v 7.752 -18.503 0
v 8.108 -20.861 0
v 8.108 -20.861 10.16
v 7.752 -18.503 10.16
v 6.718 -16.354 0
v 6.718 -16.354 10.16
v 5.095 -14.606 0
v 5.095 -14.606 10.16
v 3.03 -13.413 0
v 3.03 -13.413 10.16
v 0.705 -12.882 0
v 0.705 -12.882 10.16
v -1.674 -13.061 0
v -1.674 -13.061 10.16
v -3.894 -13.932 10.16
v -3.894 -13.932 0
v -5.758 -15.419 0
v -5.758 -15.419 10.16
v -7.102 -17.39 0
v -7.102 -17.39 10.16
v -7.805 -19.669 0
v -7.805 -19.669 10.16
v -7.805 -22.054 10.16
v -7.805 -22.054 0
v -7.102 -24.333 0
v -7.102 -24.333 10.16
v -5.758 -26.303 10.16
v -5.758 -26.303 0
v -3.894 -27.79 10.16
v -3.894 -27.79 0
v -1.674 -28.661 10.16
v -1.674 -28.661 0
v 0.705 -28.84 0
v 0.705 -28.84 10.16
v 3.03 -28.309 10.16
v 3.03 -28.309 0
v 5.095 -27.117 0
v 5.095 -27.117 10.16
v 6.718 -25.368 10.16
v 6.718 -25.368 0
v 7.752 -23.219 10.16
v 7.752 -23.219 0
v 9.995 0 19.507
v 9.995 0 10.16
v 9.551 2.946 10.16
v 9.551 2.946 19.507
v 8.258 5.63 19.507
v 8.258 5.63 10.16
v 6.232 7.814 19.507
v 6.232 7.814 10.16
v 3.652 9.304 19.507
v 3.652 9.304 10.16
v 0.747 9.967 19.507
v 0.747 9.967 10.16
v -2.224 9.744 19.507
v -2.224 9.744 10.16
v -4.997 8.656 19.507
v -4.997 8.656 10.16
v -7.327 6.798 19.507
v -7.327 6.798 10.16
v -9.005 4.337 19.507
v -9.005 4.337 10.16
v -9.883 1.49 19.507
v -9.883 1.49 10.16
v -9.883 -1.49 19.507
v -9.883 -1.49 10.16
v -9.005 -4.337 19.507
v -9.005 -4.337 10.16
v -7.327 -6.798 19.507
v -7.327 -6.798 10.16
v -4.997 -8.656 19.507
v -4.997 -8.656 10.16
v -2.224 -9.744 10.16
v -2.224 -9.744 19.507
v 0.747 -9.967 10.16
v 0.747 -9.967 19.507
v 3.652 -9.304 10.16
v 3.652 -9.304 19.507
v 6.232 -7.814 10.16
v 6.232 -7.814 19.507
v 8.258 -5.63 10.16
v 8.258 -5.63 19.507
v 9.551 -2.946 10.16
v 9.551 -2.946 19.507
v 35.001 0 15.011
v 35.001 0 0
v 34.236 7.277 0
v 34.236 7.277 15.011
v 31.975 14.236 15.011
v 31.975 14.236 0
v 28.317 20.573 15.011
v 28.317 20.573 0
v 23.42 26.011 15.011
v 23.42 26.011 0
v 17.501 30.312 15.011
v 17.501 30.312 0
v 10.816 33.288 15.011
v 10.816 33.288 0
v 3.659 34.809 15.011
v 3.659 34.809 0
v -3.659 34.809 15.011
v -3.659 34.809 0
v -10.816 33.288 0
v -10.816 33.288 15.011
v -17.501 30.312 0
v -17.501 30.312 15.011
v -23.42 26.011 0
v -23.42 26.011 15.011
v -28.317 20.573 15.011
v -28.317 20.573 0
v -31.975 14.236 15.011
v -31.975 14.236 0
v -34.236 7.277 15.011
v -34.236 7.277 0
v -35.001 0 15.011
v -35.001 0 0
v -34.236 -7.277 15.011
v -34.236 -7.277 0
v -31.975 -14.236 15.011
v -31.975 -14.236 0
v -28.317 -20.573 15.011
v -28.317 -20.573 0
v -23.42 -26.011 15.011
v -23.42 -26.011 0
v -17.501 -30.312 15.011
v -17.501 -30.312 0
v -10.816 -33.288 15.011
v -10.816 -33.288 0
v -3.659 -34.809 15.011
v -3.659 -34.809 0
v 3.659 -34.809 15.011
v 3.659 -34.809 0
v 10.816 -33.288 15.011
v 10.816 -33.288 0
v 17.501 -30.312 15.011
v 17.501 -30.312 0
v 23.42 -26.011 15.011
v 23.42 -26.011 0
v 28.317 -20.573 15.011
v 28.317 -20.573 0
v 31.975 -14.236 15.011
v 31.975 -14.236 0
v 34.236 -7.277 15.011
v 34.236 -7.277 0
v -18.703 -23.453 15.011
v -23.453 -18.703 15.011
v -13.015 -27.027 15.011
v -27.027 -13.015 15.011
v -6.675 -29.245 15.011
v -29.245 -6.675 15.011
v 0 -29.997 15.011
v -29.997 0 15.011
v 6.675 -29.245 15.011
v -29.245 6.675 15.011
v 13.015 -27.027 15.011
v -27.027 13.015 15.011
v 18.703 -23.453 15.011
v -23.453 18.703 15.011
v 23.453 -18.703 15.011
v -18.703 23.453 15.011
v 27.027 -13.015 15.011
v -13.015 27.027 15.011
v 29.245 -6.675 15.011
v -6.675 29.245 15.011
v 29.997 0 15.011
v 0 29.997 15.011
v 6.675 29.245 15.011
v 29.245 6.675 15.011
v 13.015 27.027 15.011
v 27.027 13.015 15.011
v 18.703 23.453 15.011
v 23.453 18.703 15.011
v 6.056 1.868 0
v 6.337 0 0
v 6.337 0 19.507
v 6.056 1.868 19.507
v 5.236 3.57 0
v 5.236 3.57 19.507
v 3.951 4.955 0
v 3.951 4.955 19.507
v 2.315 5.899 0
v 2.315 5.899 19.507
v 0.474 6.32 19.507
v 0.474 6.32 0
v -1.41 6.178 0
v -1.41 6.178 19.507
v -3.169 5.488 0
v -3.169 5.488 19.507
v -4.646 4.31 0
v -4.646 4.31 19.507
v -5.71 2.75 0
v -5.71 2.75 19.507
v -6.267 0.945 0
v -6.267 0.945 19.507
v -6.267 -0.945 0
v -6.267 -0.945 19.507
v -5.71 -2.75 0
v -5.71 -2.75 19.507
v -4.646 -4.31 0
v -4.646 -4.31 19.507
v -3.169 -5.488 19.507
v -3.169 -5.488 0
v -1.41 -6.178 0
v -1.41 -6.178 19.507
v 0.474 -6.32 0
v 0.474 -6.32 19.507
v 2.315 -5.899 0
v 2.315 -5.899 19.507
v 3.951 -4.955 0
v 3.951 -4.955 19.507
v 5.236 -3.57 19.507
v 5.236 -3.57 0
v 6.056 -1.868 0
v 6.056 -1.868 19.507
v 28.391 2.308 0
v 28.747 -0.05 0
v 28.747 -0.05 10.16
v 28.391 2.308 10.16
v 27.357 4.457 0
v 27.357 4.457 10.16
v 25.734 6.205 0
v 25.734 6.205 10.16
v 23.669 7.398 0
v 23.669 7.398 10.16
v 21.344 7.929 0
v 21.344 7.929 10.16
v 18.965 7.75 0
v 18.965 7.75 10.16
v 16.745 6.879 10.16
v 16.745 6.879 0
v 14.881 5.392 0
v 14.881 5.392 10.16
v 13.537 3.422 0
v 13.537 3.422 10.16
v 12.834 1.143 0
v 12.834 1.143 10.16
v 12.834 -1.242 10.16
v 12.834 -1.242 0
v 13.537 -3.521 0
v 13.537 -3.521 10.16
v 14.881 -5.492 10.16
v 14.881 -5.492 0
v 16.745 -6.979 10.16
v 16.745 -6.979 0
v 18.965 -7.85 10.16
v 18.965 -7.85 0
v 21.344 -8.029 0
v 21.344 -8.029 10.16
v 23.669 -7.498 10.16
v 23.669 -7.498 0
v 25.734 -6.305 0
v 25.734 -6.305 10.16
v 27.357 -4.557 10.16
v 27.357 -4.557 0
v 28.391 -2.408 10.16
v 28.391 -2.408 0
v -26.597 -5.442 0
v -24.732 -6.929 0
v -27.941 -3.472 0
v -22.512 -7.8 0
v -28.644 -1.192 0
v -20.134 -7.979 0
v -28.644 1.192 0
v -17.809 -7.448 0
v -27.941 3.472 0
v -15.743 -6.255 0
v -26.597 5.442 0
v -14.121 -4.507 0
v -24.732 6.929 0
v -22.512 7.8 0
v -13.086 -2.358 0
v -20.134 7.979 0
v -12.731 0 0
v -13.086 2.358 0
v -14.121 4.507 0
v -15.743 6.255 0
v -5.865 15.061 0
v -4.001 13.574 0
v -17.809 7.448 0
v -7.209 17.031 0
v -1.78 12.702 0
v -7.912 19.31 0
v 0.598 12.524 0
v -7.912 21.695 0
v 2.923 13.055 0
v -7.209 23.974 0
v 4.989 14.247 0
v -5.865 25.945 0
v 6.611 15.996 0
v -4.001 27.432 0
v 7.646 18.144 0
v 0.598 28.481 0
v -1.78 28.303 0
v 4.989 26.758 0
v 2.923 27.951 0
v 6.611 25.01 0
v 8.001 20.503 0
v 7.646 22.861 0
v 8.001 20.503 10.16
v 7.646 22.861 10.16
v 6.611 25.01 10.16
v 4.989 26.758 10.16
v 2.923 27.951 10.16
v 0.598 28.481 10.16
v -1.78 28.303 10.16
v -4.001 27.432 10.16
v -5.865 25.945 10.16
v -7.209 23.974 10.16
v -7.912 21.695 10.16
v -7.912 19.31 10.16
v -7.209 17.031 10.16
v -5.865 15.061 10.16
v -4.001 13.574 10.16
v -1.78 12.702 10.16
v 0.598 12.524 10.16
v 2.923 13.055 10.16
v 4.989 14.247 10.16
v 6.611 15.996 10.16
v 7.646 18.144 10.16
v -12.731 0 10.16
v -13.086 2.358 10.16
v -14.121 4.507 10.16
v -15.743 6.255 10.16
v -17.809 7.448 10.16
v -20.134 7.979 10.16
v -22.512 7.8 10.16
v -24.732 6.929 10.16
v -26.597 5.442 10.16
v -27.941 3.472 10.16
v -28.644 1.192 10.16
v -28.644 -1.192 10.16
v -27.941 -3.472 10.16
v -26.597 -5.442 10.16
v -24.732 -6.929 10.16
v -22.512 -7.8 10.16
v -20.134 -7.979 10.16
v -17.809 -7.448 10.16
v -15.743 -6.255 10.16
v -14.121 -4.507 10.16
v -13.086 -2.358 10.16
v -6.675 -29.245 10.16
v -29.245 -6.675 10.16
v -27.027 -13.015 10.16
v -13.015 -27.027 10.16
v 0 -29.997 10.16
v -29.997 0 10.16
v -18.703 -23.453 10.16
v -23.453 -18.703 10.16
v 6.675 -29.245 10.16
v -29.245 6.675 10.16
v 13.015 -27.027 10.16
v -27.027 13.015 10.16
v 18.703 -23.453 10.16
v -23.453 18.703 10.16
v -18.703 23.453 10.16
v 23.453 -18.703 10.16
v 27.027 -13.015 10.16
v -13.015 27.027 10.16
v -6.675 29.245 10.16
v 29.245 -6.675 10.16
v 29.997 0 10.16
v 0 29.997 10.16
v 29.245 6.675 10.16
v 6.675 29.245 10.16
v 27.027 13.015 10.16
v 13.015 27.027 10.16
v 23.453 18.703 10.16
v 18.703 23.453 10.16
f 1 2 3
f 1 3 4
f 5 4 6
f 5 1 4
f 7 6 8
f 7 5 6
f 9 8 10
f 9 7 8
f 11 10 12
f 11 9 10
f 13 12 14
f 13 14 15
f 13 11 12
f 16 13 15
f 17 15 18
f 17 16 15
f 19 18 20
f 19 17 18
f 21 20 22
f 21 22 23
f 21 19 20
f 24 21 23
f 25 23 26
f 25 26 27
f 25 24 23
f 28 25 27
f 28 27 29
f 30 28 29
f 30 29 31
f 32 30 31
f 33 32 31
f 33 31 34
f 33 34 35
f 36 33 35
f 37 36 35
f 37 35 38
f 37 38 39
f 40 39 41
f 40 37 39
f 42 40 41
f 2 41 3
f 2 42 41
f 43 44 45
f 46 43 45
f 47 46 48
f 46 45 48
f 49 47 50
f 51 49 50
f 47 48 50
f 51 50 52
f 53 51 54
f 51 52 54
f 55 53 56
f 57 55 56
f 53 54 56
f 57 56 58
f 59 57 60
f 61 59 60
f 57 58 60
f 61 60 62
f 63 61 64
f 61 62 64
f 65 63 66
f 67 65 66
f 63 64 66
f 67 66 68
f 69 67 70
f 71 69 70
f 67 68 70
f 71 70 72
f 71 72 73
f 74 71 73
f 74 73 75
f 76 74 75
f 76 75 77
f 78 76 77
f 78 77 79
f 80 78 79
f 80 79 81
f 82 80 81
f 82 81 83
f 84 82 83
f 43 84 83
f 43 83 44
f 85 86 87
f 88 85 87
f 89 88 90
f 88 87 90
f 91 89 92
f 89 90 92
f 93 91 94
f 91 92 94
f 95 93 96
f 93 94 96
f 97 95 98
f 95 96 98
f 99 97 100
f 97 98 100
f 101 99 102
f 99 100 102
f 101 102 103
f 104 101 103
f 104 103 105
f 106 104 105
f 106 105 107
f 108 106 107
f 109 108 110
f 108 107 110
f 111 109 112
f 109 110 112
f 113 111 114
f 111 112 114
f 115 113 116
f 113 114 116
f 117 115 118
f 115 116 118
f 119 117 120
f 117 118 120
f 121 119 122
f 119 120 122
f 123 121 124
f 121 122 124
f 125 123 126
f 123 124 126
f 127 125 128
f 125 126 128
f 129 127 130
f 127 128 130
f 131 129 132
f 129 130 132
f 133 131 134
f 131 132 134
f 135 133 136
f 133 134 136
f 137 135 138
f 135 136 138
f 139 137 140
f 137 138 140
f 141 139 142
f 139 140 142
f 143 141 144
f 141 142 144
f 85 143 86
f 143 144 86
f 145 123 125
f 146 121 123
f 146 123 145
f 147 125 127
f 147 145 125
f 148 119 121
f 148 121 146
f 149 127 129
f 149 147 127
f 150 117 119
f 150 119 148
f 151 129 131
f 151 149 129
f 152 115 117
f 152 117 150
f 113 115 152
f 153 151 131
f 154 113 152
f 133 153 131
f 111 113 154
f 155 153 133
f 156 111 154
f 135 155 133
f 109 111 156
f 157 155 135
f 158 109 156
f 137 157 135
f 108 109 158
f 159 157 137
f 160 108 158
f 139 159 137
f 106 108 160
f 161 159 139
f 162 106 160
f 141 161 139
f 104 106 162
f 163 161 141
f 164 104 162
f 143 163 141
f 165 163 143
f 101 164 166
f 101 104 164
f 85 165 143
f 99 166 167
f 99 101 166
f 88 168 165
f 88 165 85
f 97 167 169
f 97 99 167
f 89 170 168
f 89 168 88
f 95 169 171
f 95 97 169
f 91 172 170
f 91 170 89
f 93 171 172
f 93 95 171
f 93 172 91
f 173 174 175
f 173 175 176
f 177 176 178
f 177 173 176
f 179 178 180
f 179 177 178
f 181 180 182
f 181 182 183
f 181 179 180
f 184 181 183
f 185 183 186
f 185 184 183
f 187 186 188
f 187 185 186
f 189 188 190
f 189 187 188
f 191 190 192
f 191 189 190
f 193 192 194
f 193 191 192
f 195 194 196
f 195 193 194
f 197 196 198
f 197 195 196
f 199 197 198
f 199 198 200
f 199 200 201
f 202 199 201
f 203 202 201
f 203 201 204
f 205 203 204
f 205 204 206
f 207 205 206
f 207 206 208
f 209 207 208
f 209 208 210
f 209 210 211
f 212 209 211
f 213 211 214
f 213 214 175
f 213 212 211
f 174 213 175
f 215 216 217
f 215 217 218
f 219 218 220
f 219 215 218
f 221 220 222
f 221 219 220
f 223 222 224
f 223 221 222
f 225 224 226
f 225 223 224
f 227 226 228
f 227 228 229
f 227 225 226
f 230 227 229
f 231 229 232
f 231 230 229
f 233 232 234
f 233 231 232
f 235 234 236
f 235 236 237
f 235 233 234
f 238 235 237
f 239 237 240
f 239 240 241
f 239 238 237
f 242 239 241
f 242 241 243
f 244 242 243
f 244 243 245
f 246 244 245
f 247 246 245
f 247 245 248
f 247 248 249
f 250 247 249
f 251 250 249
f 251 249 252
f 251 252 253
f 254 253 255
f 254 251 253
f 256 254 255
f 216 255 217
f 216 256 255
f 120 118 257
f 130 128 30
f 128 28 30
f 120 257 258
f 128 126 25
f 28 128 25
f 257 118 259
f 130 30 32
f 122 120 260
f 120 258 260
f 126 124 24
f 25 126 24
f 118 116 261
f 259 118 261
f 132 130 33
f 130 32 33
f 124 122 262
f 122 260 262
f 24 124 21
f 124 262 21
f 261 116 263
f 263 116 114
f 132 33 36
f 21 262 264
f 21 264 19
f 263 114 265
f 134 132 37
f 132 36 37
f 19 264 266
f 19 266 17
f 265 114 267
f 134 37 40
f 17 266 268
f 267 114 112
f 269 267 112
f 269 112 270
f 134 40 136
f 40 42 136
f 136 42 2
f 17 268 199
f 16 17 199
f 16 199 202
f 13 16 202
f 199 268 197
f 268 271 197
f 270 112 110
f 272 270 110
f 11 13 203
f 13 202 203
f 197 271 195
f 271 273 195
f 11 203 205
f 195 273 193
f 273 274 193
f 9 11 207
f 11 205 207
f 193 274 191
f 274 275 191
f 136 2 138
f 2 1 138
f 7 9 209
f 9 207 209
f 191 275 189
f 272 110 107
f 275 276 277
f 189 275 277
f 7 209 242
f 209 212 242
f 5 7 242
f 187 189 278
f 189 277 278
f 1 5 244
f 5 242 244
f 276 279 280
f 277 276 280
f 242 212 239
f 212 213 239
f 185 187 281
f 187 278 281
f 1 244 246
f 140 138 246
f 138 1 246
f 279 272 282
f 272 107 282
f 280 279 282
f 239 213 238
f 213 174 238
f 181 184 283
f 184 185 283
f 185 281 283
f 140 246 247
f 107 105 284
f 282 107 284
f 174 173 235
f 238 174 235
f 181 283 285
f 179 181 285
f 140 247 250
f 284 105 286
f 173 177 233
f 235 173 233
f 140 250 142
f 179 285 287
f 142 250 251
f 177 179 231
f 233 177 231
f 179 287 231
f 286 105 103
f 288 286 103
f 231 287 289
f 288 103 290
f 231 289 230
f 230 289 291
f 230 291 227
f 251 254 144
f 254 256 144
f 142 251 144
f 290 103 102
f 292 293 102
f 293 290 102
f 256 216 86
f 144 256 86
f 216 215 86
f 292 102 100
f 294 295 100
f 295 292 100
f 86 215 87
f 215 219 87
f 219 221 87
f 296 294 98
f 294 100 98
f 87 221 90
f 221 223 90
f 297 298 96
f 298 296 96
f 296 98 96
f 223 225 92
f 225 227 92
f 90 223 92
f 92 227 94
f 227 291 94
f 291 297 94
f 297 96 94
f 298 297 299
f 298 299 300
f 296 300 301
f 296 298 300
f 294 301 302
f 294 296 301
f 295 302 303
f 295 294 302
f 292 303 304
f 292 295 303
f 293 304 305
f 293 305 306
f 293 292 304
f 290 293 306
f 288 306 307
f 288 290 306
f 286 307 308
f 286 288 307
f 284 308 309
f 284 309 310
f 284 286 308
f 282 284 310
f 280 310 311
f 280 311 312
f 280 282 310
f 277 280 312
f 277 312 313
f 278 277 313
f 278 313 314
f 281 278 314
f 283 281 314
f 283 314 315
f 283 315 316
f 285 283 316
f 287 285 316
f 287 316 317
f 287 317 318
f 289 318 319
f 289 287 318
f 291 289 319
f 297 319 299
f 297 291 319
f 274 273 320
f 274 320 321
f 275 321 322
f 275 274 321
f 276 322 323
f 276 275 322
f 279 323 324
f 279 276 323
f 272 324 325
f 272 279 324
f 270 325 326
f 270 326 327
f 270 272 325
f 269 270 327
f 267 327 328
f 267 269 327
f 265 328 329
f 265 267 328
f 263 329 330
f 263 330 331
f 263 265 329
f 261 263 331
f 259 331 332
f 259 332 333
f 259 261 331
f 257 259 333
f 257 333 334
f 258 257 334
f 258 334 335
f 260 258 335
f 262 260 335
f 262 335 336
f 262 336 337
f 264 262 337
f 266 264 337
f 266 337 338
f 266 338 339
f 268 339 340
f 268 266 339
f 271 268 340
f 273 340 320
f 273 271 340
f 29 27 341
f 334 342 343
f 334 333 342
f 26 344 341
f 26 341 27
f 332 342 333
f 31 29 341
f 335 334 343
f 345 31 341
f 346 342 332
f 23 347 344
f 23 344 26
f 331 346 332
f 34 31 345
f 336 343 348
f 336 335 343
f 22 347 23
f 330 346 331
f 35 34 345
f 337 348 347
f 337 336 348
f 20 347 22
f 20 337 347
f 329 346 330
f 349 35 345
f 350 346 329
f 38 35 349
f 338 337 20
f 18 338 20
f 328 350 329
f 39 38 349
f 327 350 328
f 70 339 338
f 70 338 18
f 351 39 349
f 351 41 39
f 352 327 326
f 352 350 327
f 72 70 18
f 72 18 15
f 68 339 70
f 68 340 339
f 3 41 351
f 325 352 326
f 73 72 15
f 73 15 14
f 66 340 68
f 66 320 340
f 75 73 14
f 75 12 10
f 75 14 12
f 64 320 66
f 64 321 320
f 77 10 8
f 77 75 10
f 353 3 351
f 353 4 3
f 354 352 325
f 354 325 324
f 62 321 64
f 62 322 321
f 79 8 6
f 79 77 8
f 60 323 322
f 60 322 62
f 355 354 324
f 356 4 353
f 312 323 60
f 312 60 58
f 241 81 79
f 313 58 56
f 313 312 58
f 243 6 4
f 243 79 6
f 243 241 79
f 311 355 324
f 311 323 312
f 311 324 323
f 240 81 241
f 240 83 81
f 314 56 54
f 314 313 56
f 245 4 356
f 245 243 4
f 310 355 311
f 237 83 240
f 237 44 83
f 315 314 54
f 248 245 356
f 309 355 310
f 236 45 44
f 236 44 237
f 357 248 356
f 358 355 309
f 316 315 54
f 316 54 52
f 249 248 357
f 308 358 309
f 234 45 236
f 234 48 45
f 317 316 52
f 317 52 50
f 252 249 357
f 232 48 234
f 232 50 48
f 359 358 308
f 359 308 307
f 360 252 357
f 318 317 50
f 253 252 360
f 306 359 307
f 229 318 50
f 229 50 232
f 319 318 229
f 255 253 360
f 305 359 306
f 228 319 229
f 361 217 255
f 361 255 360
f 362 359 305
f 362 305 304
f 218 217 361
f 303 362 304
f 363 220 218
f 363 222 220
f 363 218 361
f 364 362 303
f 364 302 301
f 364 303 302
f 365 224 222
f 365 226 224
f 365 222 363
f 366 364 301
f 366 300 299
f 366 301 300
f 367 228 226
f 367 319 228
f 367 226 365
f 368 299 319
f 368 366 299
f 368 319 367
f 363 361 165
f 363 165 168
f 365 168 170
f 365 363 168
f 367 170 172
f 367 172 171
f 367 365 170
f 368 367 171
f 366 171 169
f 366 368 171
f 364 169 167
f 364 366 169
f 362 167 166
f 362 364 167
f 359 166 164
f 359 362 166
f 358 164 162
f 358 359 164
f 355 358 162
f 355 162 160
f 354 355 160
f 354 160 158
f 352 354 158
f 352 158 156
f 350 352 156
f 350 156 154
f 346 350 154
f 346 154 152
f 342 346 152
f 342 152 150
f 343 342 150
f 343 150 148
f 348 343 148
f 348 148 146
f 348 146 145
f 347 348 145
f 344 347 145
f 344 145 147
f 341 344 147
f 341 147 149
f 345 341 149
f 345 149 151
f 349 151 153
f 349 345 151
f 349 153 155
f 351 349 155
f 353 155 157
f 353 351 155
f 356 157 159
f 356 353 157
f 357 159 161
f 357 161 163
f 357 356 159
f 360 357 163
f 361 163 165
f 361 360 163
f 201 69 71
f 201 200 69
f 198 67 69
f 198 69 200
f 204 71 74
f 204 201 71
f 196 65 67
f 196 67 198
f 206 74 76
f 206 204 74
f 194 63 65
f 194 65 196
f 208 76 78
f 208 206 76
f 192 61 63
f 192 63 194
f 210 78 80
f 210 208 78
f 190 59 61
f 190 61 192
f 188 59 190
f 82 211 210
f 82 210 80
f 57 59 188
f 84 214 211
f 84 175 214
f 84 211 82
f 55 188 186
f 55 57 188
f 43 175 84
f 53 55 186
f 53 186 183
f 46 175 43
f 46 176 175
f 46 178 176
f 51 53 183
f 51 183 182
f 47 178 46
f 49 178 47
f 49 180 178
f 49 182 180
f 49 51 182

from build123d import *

# Parameters (mm, degrees)
F0_R     = 35.0012
F0_R_2   = 29.9974
F1_DEPTH = 15.0114
F0_R_3   = 8.001
F0_R_4   = 9.9949
F2_DEPTH = 10.16
F0_R_5   = 6.3373
F3_DEPTH = 19.5072


# Not quite as in the source:
# - a feature names something its author has since deleted; it is built from what else it names


with BuildPart() as f1:
    # F0 (on Top) → F1 (new body)
    with BuildSketch(Plane.XY):
        Circle(F0_R)
        Circle(F0_R_2, mode=Mode.SUBTRACT)
    extrude(amount=F1_DEPTH)

    # F0 (on Top) → F2 (join)
    with BuildSketch(Plane.XY):
        Circle(F0_R_2)
        with Locations((0.1067890262, -20.8610873669)):
            Circle(F0_R_3, mode=Mode.SUBTRACT)
        with Locations((20.7458101213, -0.0499814087)):
            Circle(F0_R_3, mode=Mode.SUBTRACT)
        with Locations((-20.7319166511, 0)):
            Circle(F0_R_3, mode=Mode.SUBTRACT)
        Circle(F0_R_4, mode=Mode.SUBTRACT)
        with Locations((0, 20.5026287585)):
            Circle(F0_R_3, mode=Mode.SUBTRACT)
    extrude(amount=F2_DEPTH)

    # F0 (on Top) → F3 (join)
    with BuildSketch(Plane.XY):
        Circle(F0_R_4)
        Circle(F0_R_5, mode=Mode.SUBTRACT)
    extrude(amount=F3_DEPTH)


solid = f1.part
